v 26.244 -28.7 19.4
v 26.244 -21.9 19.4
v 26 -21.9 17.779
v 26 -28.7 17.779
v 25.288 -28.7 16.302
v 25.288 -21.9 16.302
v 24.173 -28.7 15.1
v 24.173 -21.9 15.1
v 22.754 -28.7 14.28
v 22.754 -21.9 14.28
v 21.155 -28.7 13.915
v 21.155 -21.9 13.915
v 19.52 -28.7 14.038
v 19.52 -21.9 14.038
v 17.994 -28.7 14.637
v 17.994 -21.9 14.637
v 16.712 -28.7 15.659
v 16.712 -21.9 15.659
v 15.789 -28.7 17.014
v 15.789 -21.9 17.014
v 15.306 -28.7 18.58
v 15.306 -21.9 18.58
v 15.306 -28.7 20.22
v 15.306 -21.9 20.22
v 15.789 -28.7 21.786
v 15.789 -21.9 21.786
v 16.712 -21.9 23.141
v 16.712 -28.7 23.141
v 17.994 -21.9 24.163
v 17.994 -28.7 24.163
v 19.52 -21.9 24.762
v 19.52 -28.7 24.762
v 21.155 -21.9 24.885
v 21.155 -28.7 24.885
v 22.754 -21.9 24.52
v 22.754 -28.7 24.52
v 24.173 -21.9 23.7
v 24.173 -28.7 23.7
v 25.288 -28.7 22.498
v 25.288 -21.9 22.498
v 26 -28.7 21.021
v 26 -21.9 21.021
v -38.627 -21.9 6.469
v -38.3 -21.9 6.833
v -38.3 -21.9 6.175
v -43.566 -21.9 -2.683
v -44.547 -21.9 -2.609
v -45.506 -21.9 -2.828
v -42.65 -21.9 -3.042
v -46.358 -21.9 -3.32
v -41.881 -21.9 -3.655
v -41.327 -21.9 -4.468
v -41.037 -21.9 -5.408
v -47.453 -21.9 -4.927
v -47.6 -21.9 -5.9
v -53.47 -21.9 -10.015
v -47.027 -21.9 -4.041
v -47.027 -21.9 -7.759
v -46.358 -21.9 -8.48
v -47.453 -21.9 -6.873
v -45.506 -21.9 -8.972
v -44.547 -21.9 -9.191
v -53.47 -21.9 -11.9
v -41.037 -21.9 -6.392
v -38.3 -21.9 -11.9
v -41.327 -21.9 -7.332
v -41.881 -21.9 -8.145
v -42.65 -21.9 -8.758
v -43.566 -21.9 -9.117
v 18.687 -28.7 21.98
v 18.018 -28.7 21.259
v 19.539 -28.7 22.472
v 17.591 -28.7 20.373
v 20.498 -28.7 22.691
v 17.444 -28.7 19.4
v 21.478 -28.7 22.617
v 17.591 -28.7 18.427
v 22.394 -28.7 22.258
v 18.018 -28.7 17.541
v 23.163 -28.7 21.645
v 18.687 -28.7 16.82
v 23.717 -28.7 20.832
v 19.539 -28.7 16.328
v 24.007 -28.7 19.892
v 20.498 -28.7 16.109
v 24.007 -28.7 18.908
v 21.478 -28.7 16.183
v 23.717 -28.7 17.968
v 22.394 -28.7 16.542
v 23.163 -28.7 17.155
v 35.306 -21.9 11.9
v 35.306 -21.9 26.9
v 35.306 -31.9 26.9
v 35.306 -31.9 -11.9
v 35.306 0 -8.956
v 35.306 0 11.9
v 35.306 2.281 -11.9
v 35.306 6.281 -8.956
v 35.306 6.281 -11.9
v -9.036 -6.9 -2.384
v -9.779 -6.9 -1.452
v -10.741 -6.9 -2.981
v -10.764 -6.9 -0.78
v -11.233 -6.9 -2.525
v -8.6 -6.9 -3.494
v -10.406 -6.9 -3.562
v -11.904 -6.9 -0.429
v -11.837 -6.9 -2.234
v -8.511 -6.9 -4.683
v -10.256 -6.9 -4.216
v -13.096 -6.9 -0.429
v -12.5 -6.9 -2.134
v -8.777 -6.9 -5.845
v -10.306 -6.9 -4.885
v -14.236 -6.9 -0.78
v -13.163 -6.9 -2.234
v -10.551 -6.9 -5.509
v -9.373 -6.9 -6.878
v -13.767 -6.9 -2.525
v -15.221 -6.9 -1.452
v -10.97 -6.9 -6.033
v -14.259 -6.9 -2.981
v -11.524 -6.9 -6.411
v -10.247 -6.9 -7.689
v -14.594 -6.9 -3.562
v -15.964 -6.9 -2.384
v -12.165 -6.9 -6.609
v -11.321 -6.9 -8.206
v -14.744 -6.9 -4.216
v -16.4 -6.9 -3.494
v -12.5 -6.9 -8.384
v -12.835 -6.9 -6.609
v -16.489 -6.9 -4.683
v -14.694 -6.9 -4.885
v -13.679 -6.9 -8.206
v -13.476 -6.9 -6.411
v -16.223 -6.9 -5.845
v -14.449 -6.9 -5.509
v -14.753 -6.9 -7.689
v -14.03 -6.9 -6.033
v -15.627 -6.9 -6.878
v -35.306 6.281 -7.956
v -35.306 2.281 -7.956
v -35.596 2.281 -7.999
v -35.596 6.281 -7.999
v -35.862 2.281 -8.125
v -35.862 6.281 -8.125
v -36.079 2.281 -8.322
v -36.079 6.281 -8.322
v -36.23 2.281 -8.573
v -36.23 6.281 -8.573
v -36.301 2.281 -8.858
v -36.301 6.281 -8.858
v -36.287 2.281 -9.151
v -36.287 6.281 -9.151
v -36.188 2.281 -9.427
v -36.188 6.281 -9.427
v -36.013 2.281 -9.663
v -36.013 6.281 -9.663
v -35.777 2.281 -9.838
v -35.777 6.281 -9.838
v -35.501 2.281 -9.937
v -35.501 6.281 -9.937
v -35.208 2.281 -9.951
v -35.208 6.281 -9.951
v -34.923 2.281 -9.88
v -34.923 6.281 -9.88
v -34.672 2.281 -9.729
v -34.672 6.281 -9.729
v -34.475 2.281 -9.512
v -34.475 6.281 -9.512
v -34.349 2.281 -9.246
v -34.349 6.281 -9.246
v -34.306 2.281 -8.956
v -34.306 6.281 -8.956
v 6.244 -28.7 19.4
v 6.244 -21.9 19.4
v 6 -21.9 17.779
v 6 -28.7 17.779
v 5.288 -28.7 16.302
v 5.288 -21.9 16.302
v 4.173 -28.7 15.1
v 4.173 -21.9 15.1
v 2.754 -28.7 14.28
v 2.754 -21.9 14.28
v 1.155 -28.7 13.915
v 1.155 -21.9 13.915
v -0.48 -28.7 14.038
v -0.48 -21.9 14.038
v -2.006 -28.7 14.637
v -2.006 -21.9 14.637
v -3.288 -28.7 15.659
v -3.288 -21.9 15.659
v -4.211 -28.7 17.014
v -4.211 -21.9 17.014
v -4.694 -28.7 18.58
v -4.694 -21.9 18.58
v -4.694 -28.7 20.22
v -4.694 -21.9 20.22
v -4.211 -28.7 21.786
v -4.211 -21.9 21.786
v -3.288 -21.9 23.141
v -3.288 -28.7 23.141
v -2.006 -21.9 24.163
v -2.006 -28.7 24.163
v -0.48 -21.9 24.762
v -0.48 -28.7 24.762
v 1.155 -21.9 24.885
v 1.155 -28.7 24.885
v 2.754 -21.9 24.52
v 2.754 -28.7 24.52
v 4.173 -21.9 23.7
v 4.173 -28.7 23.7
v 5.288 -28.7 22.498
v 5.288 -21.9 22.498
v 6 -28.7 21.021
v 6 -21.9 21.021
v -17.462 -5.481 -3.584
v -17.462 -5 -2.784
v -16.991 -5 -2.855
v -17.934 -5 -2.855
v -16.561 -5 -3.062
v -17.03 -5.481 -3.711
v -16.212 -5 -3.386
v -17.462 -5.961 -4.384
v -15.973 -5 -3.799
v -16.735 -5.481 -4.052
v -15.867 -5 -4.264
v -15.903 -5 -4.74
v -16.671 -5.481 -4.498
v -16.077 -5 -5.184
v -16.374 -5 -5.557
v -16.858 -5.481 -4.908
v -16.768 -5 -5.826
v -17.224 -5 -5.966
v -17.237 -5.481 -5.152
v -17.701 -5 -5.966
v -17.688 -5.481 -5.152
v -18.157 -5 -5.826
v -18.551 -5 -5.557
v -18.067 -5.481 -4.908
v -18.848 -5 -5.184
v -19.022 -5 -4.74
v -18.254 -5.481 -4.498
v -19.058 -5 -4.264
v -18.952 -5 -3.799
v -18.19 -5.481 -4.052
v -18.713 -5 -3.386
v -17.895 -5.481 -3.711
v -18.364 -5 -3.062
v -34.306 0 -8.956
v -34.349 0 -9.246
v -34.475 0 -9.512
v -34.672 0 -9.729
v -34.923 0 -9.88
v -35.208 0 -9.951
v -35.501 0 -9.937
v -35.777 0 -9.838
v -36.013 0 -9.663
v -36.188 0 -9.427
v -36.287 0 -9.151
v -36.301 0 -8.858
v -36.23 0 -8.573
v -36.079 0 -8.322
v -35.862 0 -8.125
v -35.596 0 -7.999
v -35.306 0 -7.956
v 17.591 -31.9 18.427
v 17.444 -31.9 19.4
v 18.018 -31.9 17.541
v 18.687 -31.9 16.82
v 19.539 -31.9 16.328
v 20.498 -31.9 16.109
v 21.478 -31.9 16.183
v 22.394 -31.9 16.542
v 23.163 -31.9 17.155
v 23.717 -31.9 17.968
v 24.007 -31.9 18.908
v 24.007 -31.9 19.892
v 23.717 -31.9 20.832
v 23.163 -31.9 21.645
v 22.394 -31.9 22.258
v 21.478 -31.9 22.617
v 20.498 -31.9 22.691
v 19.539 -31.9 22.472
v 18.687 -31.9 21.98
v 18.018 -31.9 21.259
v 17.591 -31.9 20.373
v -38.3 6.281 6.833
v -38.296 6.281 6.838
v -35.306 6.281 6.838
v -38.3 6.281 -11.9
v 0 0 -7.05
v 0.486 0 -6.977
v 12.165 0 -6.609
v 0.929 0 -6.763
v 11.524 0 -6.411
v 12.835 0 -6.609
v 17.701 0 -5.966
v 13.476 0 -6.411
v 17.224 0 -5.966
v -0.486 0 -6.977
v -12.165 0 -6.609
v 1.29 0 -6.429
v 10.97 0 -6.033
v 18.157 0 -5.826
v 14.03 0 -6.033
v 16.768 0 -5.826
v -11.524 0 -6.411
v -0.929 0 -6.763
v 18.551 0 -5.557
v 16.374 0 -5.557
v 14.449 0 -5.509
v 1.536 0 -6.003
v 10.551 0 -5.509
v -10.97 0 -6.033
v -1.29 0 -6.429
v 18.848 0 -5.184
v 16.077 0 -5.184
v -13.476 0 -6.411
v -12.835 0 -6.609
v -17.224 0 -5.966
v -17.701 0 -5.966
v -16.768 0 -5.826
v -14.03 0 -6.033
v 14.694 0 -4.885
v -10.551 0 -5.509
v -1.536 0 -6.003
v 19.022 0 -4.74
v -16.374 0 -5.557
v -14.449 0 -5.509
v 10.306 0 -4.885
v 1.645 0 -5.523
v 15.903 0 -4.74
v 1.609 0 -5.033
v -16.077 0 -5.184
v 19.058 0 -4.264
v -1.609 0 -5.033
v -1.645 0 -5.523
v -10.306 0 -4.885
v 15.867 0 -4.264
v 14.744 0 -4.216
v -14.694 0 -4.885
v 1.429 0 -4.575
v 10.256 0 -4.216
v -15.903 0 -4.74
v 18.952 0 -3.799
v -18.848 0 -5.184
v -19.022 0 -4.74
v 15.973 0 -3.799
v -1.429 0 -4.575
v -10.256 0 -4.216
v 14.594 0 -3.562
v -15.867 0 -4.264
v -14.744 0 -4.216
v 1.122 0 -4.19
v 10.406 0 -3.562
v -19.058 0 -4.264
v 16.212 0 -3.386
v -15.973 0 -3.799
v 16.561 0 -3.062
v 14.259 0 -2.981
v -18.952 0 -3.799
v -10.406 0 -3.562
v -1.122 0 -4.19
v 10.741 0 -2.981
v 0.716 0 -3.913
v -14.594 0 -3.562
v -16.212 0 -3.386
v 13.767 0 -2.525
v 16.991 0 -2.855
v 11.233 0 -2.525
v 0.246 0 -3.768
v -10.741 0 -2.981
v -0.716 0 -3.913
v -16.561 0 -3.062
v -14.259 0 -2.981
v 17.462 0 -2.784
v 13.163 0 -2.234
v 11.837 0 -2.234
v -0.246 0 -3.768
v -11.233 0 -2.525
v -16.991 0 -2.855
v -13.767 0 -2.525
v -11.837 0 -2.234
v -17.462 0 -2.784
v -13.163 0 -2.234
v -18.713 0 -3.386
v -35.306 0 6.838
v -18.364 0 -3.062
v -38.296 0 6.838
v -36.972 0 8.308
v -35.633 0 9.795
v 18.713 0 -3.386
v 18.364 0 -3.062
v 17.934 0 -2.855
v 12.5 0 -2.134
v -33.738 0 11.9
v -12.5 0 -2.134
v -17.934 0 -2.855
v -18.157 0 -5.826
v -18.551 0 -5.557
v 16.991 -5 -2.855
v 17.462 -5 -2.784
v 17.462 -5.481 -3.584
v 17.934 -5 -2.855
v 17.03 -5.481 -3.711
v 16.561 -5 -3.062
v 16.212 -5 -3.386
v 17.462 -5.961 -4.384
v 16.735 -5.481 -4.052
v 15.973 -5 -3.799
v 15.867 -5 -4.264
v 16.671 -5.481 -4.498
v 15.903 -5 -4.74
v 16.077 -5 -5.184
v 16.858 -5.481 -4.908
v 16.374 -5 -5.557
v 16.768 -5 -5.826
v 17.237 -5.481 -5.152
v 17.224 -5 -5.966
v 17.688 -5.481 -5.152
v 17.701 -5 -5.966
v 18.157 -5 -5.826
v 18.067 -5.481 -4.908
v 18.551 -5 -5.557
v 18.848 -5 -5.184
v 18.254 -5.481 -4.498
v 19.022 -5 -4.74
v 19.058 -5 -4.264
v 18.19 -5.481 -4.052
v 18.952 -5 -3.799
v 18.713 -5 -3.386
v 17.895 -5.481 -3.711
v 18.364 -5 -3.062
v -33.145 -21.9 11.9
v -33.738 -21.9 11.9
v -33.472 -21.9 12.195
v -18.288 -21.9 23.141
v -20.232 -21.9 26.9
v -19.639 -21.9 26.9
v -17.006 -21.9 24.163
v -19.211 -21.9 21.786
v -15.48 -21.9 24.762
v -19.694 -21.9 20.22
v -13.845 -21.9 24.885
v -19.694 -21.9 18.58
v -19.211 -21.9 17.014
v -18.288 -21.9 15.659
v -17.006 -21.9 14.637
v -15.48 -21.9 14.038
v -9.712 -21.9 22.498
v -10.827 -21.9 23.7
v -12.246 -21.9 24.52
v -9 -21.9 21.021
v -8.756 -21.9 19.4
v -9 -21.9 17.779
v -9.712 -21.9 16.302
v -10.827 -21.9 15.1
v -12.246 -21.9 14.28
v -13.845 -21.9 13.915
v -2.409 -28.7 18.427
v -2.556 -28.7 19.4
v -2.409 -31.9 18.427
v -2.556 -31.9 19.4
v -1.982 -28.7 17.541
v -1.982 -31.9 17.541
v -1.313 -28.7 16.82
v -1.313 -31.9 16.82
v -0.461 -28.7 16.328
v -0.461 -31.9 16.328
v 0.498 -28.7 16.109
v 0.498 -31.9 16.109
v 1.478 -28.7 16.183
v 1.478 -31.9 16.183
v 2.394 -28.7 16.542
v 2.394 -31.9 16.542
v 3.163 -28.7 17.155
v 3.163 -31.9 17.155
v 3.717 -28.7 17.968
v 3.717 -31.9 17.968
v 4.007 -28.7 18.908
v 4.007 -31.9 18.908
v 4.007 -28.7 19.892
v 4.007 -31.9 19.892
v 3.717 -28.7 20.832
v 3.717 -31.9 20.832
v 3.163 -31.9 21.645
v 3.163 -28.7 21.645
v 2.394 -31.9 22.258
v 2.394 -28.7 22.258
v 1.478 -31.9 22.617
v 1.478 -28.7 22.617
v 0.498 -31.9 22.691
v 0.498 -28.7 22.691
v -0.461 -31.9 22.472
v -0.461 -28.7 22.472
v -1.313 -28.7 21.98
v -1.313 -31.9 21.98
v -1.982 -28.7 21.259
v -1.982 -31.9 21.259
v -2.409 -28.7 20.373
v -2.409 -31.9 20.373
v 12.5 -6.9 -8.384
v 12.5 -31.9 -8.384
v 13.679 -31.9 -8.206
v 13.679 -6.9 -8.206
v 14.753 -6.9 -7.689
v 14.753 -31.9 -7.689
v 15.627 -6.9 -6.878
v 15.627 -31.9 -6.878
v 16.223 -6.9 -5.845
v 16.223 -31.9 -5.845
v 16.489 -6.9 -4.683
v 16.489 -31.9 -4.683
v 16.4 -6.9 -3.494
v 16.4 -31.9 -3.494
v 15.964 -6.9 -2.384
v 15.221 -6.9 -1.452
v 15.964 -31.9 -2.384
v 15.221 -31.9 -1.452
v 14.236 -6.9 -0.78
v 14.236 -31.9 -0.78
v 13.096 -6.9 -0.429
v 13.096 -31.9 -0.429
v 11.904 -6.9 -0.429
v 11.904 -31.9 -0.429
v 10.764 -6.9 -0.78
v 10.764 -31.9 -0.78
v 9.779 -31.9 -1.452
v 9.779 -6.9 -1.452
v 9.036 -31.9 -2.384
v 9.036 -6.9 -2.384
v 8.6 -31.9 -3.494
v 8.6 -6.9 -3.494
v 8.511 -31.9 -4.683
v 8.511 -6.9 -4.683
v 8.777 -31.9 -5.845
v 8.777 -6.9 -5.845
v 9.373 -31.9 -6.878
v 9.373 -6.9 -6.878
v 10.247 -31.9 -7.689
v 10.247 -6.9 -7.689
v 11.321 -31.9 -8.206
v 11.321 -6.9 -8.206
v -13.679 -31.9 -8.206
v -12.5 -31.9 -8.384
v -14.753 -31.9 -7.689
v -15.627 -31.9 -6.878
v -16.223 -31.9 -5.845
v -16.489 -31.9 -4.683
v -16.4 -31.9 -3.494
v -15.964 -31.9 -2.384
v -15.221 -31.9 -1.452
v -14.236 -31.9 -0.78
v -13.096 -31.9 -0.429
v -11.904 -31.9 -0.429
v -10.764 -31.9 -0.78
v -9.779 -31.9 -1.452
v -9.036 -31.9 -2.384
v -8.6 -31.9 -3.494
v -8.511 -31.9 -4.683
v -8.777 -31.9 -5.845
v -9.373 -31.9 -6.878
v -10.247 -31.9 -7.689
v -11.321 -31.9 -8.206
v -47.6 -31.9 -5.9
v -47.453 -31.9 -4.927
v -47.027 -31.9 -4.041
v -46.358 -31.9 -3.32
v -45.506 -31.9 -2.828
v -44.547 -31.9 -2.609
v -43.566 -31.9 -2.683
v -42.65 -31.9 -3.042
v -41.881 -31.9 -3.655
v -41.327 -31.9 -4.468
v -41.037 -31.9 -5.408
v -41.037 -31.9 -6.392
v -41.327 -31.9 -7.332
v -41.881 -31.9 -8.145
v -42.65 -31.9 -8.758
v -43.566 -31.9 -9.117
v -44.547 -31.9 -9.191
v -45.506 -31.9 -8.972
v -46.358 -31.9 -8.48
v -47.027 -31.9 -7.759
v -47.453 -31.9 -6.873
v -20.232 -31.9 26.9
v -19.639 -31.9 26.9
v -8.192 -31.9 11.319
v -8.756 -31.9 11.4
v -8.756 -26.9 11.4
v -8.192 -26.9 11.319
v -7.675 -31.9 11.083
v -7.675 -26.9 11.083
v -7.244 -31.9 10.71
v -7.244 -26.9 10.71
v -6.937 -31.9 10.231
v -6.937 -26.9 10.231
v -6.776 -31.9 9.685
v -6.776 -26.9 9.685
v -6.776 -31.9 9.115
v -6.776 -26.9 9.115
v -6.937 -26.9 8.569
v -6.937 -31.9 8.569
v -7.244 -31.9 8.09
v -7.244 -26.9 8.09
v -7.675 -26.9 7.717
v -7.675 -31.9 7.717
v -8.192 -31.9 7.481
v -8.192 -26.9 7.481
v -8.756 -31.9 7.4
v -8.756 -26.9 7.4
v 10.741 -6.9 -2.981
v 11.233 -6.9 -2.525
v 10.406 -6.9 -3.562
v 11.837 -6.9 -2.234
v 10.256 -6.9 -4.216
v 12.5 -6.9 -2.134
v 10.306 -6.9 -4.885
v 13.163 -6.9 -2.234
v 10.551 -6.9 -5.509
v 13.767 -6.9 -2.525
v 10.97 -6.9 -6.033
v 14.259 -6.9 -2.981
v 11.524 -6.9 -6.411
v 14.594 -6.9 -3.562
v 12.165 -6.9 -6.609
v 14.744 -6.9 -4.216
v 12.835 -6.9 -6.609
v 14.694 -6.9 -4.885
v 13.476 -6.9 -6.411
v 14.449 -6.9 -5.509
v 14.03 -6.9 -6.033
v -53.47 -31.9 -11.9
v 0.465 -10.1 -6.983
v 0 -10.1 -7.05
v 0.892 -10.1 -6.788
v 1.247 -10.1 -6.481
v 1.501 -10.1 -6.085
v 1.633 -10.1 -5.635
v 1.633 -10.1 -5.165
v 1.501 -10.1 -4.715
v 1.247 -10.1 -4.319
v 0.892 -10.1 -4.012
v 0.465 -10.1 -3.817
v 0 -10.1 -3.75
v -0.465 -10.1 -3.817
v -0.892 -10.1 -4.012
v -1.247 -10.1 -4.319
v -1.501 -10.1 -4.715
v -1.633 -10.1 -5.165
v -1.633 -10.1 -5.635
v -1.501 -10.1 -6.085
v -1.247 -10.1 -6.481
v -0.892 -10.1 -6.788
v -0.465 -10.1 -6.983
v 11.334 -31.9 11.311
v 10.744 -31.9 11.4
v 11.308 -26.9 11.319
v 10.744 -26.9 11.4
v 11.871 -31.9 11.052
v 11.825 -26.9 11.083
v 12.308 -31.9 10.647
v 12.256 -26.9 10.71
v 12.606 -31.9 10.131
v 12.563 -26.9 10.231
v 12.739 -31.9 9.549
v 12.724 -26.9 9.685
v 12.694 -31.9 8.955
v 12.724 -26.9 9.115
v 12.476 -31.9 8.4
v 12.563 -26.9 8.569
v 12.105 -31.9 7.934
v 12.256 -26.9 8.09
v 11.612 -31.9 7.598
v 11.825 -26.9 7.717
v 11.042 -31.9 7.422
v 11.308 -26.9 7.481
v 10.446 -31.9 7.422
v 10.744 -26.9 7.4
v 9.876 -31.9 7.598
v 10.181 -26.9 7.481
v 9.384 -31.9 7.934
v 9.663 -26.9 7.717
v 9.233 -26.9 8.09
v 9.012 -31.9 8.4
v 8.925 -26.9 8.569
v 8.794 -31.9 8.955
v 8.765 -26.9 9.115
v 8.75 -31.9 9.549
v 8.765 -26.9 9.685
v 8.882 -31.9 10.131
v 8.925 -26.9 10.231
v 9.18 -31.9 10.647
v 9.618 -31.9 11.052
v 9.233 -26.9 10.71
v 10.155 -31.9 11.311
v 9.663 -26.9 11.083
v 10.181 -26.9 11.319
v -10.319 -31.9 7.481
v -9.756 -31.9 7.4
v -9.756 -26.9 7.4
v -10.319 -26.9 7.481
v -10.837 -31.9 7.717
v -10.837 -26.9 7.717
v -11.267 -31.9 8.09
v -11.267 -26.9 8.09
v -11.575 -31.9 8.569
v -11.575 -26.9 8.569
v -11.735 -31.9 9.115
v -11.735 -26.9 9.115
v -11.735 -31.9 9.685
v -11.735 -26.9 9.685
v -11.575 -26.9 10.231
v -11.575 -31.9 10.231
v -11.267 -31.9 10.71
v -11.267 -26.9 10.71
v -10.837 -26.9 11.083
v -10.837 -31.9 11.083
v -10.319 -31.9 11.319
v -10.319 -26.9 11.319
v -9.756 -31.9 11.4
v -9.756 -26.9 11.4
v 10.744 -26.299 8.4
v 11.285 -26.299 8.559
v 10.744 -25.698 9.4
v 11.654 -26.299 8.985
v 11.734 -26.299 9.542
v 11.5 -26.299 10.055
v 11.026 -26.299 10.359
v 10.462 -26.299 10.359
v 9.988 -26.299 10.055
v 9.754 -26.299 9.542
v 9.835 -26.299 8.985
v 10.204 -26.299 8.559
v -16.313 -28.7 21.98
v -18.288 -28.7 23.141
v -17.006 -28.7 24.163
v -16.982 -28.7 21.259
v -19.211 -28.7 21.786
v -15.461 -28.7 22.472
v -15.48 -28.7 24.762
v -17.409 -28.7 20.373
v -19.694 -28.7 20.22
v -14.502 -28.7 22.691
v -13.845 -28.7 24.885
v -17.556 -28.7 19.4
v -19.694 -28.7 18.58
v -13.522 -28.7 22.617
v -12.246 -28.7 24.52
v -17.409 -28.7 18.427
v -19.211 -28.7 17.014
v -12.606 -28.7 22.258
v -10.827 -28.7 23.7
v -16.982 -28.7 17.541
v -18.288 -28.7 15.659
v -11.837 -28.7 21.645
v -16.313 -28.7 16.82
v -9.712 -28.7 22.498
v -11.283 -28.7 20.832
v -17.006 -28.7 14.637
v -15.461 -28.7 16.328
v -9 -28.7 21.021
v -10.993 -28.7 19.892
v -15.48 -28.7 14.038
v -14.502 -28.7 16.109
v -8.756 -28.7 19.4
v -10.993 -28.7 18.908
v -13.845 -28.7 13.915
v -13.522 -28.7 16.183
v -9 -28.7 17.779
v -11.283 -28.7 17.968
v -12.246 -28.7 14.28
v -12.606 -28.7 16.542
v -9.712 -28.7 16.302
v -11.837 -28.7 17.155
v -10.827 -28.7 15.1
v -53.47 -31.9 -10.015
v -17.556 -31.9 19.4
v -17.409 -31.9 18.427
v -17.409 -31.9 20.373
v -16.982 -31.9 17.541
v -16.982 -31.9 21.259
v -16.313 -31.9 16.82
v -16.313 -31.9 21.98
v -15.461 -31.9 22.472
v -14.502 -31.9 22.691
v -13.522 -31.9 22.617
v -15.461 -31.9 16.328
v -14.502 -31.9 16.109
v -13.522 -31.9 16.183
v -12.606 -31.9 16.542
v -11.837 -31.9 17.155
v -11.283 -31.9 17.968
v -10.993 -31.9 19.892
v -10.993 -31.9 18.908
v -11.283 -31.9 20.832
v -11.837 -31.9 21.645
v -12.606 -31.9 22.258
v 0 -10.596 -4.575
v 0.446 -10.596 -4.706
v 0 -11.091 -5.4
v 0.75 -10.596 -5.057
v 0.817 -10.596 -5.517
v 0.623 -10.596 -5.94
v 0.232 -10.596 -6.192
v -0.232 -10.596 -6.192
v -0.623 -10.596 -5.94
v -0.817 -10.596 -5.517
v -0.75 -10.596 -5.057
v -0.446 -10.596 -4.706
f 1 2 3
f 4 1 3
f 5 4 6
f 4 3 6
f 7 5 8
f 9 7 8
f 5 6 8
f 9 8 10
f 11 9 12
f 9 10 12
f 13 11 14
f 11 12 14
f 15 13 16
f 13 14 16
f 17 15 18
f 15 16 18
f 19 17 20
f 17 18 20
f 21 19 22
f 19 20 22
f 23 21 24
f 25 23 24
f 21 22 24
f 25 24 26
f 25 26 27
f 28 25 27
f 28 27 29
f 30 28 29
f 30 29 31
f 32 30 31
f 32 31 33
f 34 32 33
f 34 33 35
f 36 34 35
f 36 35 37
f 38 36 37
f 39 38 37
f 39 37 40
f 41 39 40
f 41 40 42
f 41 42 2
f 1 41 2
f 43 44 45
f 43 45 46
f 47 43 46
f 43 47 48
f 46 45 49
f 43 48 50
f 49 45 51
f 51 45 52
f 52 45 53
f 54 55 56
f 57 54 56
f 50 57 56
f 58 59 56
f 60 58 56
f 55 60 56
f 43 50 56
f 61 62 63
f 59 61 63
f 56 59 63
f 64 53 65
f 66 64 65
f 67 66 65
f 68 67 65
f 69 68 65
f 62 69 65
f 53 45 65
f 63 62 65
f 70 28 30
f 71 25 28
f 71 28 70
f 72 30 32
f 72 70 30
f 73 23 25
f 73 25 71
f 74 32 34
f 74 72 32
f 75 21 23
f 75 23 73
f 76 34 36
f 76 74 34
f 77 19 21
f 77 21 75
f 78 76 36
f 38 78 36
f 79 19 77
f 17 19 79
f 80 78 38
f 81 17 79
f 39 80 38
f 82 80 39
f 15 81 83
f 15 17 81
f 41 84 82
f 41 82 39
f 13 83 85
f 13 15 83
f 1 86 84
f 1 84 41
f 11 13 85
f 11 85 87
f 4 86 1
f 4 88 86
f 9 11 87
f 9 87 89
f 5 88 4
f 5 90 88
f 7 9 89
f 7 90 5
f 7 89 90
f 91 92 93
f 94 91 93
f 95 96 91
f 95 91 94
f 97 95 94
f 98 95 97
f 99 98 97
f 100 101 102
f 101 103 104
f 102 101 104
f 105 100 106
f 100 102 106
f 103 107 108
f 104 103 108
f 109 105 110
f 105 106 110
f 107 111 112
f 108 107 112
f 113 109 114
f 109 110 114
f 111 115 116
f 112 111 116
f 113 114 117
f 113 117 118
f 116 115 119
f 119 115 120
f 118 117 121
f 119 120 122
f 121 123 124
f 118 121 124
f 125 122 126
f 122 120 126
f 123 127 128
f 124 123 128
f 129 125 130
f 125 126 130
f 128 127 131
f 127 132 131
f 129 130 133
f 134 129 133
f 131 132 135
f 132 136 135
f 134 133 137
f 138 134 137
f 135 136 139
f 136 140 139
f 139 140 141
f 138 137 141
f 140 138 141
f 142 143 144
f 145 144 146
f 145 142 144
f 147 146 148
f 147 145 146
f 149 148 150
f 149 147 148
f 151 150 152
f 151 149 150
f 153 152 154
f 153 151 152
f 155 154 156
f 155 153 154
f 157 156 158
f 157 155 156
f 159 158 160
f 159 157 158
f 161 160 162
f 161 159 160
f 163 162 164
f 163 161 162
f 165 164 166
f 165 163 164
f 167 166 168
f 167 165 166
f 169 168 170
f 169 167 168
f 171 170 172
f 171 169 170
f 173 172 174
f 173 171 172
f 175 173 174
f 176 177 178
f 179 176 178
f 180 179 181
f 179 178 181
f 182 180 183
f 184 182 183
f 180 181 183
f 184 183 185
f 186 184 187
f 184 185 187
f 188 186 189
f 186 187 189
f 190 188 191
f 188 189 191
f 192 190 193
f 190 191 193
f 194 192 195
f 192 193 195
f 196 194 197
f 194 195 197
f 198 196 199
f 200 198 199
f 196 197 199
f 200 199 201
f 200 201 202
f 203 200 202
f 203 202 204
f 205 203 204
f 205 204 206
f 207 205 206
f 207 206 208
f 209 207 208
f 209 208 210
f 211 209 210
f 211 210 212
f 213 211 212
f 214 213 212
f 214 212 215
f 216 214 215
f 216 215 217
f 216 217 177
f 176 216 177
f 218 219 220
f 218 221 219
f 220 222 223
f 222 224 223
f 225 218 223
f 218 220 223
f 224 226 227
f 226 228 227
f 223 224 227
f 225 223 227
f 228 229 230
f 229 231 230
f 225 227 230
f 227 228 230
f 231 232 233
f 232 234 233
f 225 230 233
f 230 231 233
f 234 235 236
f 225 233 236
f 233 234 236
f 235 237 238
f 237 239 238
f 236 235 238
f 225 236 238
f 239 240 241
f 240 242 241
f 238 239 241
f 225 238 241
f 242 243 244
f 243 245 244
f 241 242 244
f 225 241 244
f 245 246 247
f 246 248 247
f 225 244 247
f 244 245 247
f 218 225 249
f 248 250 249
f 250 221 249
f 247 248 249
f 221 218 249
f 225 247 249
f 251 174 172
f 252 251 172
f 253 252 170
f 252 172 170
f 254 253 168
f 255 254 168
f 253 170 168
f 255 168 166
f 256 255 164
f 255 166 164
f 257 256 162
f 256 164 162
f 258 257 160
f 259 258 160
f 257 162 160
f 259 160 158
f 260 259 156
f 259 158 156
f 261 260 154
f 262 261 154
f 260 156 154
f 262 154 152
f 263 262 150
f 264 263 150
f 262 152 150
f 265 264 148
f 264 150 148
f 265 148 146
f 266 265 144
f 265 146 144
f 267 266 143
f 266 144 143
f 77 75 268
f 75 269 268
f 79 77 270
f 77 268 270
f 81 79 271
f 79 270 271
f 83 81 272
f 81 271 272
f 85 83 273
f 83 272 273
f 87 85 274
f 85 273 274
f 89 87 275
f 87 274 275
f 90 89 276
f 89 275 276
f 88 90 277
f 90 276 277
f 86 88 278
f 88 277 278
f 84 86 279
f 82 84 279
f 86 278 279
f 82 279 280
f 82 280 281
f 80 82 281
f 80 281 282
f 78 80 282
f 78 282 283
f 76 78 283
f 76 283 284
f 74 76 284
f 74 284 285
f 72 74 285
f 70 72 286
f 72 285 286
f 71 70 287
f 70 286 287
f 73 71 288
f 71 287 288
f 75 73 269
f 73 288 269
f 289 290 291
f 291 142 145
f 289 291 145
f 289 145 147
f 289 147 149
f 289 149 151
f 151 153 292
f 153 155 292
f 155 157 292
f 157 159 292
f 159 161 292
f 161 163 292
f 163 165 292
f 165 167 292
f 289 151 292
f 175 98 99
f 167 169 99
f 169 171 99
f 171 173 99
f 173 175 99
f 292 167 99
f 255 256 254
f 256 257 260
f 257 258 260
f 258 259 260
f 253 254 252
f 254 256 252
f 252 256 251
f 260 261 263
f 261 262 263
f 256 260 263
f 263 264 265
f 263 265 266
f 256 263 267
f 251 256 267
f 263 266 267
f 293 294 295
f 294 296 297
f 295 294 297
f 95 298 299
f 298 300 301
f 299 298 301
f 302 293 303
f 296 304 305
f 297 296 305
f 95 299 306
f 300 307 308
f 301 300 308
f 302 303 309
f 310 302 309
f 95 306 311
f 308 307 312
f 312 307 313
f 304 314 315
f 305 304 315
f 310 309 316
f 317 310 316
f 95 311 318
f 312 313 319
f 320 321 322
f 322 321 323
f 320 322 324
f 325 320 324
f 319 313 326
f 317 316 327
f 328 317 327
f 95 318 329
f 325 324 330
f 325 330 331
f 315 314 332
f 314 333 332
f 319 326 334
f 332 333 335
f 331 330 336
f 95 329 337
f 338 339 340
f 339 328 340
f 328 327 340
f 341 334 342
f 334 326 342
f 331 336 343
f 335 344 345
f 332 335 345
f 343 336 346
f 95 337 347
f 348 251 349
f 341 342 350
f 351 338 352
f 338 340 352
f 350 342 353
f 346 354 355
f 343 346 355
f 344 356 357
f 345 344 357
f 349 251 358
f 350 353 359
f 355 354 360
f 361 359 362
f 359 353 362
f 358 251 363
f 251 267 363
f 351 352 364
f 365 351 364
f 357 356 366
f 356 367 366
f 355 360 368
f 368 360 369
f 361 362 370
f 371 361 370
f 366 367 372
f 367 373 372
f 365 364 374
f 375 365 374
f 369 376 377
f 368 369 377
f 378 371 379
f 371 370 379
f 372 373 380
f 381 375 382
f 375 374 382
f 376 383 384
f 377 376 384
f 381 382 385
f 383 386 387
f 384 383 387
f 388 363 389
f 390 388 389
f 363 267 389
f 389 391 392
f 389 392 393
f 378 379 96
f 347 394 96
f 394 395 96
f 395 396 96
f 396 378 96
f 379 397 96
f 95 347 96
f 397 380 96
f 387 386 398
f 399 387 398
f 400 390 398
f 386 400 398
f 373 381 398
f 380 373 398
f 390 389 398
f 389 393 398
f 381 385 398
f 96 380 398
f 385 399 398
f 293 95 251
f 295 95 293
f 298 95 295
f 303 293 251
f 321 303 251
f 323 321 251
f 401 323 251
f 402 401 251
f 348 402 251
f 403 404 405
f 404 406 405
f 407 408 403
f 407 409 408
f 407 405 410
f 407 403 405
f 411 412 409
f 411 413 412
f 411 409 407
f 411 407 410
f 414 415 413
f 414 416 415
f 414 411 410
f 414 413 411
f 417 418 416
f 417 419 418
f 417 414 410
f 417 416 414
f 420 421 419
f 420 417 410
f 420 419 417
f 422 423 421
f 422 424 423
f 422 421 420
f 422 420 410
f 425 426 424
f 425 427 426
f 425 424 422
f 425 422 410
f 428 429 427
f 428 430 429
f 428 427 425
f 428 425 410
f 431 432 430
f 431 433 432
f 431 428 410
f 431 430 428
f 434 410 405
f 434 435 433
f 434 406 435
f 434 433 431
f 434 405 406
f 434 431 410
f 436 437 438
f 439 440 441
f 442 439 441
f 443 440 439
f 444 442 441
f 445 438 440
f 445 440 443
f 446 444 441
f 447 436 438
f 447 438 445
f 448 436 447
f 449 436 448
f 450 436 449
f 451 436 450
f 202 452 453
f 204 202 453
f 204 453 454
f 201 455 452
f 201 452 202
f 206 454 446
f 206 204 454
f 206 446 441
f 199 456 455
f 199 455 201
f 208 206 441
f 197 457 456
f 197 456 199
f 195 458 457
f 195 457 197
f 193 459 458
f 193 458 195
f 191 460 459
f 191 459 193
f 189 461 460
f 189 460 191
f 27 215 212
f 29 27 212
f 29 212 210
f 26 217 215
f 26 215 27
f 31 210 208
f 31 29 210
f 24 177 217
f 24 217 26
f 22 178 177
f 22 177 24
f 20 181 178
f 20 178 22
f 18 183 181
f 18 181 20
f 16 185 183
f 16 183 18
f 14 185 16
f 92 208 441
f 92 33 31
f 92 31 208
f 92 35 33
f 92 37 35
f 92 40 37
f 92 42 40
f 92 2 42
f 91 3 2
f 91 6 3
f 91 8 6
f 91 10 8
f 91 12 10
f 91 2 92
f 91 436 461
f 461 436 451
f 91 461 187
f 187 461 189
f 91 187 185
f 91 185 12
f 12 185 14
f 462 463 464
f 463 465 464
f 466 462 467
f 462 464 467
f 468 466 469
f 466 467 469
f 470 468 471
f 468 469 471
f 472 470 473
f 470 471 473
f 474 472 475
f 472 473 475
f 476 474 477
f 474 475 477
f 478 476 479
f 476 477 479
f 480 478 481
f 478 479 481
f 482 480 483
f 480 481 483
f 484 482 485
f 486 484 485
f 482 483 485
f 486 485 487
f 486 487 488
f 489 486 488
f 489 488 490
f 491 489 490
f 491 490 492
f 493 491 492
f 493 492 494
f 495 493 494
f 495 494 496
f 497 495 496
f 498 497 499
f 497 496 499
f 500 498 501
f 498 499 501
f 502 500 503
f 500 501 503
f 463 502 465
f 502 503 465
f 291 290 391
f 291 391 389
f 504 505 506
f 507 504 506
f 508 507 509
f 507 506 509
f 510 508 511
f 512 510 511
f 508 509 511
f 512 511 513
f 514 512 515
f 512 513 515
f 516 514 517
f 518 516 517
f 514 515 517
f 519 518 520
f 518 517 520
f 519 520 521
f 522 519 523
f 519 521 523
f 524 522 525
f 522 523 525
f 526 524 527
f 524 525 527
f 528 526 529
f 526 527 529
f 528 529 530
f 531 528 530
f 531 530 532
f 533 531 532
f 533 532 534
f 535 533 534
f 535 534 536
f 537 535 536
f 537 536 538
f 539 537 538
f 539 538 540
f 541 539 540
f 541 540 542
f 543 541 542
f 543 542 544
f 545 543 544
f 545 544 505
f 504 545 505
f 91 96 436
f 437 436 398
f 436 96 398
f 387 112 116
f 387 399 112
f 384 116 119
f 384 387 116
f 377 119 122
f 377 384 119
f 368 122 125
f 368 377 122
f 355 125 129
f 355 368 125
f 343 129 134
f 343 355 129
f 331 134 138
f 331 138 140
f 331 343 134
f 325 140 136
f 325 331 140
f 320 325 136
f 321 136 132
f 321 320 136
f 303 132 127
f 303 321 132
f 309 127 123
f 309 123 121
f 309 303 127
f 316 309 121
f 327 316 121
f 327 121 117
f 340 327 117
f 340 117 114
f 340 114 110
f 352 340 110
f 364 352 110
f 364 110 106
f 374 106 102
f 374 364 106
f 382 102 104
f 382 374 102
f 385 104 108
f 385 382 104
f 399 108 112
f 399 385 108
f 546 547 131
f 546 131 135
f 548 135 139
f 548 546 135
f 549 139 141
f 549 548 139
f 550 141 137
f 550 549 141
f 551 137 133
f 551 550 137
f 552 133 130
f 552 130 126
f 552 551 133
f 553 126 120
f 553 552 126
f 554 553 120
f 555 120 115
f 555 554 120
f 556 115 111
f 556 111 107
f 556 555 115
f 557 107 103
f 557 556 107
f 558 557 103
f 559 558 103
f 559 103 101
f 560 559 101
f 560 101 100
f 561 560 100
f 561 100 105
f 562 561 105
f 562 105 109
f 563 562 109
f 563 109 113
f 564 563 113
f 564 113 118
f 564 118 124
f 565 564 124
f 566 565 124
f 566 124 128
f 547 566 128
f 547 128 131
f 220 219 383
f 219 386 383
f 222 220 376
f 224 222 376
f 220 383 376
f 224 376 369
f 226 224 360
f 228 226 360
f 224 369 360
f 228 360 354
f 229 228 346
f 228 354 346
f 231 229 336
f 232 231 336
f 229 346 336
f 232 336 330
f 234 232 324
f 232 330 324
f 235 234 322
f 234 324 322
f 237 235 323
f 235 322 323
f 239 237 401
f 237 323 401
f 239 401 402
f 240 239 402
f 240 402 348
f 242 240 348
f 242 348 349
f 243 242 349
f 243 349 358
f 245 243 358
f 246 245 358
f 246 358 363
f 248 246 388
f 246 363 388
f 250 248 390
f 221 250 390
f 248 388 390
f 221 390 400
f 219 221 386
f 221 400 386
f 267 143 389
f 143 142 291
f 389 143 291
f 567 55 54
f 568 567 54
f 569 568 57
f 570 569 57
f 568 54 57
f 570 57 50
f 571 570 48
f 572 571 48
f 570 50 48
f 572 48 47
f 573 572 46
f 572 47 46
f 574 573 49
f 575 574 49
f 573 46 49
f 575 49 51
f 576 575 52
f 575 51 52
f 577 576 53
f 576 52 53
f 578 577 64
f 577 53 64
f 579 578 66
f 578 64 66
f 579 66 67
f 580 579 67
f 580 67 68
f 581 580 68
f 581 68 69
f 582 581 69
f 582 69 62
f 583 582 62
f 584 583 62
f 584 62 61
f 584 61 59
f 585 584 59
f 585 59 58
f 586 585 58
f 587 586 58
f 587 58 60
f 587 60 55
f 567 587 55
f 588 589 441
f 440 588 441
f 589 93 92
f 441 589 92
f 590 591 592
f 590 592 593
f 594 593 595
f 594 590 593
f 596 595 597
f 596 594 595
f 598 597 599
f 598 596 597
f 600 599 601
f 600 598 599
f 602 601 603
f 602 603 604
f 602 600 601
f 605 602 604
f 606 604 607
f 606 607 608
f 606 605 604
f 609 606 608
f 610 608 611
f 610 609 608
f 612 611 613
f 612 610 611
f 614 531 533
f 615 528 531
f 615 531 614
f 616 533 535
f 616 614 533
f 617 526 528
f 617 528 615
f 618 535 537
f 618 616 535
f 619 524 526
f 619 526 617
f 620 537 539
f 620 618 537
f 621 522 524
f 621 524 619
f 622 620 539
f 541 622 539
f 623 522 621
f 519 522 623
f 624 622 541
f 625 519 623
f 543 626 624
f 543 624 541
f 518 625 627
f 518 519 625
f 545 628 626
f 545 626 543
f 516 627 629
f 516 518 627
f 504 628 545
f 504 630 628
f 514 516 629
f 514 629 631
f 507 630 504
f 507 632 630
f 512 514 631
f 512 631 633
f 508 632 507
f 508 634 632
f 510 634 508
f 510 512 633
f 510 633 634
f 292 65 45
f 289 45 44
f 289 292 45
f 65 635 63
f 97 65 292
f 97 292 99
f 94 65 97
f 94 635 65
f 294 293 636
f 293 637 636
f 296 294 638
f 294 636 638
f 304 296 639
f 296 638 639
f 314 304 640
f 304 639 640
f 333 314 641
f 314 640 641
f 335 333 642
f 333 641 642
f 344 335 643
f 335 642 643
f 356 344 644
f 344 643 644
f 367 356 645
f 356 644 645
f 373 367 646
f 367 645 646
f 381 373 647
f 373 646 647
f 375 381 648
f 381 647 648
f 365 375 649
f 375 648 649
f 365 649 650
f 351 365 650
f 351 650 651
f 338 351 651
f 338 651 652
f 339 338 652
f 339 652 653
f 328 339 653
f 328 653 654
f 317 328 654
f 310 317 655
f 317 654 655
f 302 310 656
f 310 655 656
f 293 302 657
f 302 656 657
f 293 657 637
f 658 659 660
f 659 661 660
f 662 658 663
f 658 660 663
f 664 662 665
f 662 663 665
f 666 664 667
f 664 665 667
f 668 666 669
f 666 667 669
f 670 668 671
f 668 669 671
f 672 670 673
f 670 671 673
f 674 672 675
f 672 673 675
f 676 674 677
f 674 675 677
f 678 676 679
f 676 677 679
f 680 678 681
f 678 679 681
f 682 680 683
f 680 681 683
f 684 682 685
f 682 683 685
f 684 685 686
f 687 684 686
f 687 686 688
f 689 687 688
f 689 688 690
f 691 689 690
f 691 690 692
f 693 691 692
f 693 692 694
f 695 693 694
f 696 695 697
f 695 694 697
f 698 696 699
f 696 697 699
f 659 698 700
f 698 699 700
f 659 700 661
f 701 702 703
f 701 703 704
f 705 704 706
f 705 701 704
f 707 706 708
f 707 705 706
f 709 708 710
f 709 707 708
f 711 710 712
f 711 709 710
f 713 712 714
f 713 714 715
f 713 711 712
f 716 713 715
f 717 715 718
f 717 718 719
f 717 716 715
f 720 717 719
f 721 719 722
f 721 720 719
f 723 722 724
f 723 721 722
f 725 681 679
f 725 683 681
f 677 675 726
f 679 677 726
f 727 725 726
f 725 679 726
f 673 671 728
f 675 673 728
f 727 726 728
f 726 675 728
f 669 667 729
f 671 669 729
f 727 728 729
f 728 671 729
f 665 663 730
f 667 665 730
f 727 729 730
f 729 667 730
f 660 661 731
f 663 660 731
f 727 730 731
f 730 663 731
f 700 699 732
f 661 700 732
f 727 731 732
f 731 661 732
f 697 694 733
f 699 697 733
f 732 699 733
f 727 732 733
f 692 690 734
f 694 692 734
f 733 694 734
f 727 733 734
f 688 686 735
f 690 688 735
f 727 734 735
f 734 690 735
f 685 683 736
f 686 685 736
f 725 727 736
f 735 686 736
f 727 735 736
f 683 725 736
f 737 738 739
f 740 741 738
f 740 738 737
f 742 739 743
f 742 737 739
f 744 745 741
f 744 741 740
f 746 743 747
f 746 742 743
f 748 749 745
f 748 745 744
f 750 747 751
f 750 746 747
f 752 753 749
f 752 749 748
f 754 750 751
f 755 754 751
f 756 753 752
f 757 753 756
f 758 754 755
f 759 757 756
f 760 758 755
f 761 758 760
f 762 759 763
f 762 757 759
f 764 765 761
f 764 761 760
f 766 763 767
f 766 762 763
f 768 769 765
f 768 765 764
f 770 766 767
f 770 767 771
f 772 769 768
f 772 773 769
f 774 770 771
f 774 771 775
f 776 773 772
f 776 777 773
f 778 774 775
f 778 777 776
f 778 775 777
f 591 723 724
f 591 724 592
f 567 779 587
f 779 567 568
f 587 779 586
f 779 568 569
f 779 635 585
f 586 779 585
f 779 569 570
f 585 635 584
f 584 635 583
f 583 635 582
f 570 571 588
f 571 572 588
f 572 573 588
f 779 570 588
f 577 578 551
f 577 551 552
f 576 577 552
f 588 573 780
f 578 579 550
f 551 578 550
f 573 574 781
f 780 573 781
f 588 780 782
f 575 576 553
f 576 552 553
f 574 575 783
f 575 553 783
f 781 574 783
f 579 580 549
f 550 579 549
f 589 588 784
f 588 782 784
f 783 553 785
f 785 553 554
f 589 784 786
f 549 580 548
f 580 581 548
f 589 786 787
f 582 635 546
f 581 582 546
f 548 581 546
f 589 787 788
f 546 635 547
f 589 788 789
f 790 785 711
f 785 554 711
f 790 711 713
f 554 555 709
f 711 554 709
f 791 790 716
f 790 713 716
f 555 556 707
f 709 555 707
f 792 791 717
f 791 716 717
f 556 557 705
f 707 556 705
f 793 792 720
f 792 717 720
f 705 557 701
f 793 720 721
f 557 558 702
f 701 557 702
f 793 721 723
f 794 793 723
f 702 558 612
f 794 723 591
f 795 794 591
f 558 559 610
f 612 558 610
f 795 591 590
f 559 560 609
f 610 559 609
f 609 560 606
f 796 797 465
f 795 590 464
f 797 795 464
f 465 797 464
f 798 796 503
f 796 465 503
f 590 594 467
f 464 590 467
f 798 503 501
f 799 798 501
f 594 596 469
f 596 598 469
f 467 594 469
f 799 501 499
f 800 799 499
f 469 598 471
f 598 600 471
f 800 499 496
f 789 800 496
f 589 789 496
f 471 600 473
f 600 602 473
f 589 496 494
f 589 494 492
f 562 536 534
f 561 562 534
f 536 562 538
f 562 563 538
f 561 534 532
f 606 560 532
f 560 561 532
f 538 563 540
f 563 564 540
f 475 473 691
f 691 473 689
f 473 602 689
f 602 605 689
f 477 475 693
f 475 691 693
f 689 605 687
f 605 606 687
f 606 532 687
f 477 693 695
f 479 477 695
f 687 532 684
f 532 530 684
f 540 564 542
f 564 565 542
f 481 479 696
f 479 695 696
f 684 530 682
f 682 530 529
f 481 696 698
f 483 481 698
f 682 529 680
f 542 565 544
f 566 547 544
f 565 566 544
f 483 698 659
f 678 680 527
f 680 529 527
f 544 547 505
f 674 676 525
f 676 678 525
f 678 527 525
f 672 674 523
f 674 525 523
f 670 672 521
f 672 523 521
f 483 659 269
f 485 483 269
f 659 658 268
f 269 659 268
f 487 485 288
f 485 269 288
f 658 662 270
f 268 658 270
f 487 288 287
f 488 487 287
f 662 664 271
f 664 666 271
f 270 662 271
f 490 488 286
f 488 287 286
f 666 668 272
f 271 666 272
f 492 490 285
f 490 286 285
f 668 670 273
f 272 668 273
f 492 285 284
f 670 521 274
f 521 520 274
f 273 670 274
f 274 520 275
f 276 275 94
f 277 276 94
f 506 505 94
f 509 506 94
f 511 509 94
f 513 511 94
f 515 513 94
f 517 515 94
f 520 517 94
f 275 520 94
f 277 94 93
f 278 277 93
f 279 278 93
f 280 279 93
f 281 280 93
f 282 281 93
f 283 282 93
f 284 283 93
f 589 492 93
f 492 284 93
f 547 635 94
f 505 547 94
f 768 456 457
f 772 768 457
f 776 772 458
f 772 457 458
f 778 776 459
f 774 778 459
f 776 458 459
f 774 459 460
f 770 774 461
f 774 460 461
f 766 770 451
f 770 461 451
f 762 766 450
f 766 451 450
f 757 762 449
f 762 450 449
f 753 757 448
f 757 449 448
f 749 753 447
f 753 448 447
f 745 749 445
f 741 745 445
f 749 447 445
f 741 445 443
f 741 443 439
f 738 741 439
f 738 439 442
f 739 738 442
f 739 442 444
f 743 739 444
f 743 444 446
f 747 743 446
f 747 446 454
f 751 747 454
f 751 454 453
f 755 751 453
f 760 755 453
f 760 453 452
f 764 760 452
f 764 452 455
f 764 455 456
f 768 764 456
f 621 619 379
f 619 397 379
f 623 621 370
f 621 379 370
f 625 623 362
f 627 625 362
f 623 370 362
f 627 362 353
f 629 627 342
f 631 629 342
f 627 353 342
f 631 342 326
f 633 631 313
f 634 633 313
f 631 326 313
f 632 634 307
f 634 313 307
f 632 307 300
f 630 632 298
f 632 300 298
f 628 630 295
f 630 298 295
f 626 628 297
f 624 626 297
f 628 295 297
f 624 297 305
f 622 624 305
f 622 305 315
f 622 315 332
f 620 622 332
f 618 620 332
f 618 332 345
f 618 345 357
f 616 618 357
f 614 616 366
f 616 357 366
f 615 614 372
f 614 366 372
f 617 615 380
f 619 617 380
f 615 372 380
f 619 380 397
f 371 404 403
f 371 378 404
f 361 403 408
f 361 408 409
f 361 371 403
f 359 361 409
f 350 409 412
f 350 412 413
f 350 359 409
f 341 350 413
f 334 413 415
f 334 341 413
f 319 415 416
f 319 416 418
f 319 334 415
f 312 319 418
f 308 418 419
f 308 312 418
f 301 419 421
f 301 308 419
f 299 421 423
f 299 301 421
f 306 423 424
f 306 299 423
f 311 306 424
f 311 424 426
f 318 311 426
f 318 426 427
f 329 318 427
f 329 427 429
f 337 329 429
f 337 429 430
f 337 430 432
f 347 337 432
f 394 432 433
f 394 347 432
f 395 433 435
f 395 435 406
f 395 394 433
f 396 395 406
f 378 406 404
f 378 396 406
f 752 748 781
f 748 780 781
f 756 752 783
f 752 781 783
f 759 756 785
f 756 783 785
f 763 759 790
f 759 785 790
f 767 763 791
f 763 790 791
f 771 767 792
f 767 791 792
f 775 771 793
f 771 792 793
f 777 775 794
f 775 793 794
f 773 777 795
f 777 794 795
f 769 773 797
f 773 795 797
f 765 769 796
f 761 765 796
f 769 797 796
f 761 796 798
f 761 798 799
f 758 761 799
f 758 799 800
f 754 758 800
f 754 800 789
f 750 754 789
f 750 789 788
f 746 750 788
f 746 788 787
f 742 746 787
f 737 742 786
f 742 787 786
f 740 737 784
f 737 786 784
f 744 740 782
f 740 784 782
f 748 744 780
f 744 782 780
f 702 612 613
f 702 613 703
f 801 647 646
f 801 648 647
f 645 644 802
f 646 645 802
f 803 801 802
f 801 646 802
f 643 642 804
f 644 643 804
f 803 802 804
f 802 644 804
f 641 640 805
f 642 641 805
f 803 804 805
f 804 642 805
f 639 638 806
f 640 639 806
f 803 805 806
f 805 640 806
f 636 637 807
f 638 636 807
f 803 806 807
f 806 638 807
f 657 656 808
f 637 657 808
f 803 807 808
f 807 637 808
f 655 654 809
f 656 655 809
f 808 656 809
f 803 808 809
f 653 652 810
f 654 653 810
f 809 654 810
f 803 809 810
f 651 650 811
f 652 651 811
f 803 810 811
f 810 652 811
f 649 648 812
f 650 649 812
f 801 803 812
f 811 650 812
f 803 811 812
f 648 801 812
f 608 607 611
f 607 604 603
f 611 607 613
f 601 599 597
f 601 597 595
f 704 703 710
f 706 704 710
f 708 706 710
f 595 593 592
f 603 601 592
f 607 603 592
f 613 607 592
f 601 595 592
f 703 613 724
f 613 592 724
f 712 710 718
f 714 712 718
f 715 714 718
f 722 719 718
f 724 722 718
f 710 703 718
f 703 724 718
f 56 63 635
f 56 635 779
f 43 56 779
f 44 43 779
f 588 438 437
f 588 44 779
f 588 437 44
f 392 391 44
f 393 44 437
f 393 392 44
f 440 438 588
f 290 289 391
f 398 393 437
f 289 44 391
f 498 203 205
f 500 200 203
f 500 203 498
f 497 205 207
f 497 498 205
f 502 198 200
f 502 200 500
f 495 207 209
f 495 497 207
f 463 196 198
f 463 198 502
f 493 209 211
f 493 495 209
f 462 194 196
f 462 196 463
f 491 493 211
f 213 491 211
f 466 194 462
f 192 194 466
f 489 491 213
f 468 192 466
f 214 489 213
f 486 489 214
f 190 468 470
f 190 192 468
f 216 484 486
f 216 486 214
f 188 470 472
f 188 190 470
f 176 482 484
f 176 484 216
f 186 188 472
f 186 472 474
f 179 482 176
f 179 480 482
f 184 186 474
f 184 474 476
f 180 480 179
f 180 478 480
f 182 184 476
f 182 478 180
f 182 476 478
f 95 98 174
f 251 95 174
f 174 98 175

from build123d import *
from build123d.topology import SkipClean

# Parameters (mm, degrees)
SKETCH_1_W                = 76.6
SKETCH_1_H                = 23.8
EXTRUDE_1_DEPTH           = 31.899999991
HOLE_WIZARD_M4_1_D        = 3.3
HOLE_WIZARD_M4_1_DEPTH    = 10.1
HOLE_WIZARD_M4_1_TIP      = 0.991420021
SKETCH_5_W                = 23.8
SKETCH_5_H                = 2.281370048
EXTRUDE_2_DEPTH           = 2.994
SKETCH_6_W                = 76.6
SKETCH_6_H                = 2.281370048
EXTRUDE_3_DEPTH           = 2.944
CUT_EXTRUDE_START         = -2.994
SKETCH_7_W                = 26.992148155
SKETCH_7_H                = 47.339562986
CUT_EXTRUDE_1_DEPTH       = 2.994
EXTRUDE_4_DEPTH           = 10
HOLE_WIZARD_3_D           = 6.6
HOLE_WIZARD_3_CBORE_D     = 11
HOLE_WIZARD_3_CBORE_DEPTH = 6.8
SKETCH_21_R               = 3.3
CUT_EXTRUDE_6_DEPTH       = 67.034934903
MM_2_D                    = 4
MM_2_DEPTH                = 5
MM_2_TIP                  = 1.201721238
CUT_EXTRUDE_7_DEPTH       = 5
SKETCH_26_W               = 46.053862543
SKETCH_26_H               = 10
CUT_EXTRUDE_8_DEPTH       = 76.924939501
CUT_EXTRUDE_9_DEPTH       = 67.034934903
SKETCH_29_R               = 1
CUT_EXTRUDE_10_DEPTH      = 2.281370048
EXTRUDE_START             = 4
EXTRUDE_5_DEPTH           = 4
CUT_EXTRUDE_11_DEPTH      = 0.5
EXTRUDE_6_DEPTH           = 0.440630619
CUT_EXTRUDE_12_DEPTH      = 28.181370038
SKETCH_35_W               = 0.294839433
SKETCH_35_H               = 10
CUT_EXTRUDE_13_DEPTH      = 100.471808588
CHAMFER_1_SIZE            = 2
HOLE_WIZARD_4_D           = 4.5
HOLE_WIZARD_4_CBORE_D     = 8
HOLE_WIZARD_4_CBORE_DEPTH = 25
CUT_EXTRUDE_14_DEPTH      = 67.233425798
CUT_EXTRUDE_15_DEPTH      = 6.281370048


with BuildPart() as part:
    # 草图1 → 凸台-拉伸1 (new body)
    with BuildSketch(Plane(origin=(0, 0, 0), x_dir=(1, 0, 0), z_dir=(0, 1, 0))):
        Rectangle(SKETCH_1_W, SKETCH_1_H)
    extrude(amount=-EXTRUDE_1_DEPTH)

    # M4 螺纹孔1
    with Locations(Plane(origin=(0, 0, -5.4), x_dir=(0, 0, 1), z_dir=(0, 1, 0))):
        with Locations((0, 0)):
            Hole(HOLE_WIZARD_M4_1_D / 2, depth=HOLE_WIZARD_M4_1_DEPTH)
            with Locations((0, 0, -(HOLE_WIZARD_M4_1_DEPTH + HOLE_WIZARD_M4_1_TIP / 2))):  # 118° drill point
                Cone(0, HOLE_WIZARD_M4_1_D / 2, HOLE_WIZARD_M4_1_TIP, mode=Mode.SUBTRACT)

    # 草图5 → 凸台-拉伸2 (add)
    with BuildSketch(Plane.ZY.offset(38.3)):
        with Locations((0, 1.140685024)):
            Rectangle(SKETCH_5_W, SKETCH_5_H)
    extrude(amount=-EXTRUDE_2_DEPTH)

    # 草图6 → 凸台-拉伸3 (add)
    with BuildSketch(Plane(origin=(0, 0, -11.9), x_dir=(-1, 0, 0), z_dir=(0, 0, -1))):
        with Locations((0, 1.140685024)):
            Rectangle(SKETCH_6_W, SKETCH_6_H)
    extrude(amount=-EXTRUDE_3_DEPTH)

    # 草图7 → 切除-拉伸1 (cut)
    with BuildSketch(Plane(origin=(38.3, 0, 0), x_dir=(0, 0, -1), z_dir=(1, 0, 0)).offset(CUT_EXTRUDE_START)):
        with Locations((-1.596074077, -8.230218498)):
            Rectangle(SKETCH_7_W, SKETCH_7_H)
    extrude(amount=CUT_EXTRUDE_1_DEPTH, mode=Mode.SUBTRACT)

    # 草图9 → 大小mm 暗销孔1 (revolve, cut)
    with BuildSketch(Plane(origin=(17.4625, 0, -4.384), x_dir=(0, 0, 1), z_dir=(1, 0, 0))):
        Polygon((0, 0), (0, 5.96137699), (1.6, 5), (1.6, 0), align=None)
    mm_1 = revolve(axis=Axis((17.4625, 6.35, -4.384), (0, -1, 0)), mode=Mode.SUBTRACT)

    # 镜向3: 大小mm 暗销孔1 across plane
    add(mm_1.mirror(Plane(origin=(0, 0, 0), x_dir=(0, 0, 1), z_dir=(1, 0, 0))), mode=Mode.SUBTRACT)

    # 草图16 → 凸台-拉伸4 (add)
    with BuildSketch(Plane.XZ.offset(31.899999991)):
        Polygon((-38.3, 6.921881597), (-55.247298311, -11.9), (-38.3, -11.9), align=None)
        Polygon((-33.817682057, 11.9), (-20.311621392, 26.9), (35.306, 26.9), (35.306, 11.9), align=None)
    extrude(amount=-EXTRUDE_4_DEPTH)

    # 打孔尺寸(%根据)内六角圆柱头螺钉的类型3 (through all)
    with Locations(Plane(origin=(-14.255841028, -21.899999991, 19.4), x_dir=(1, 0, 0), z_dir=(0, 1, 0))):
        with Locations((0, 0), (15, 0), (35, 0)):
            CounterBoreHole(HOLE_WIZARD_3_D / 2, HOLE_WIZARD_3_CBORE_D / 2, HOLE_WIZARD_3_CBORE_DEPTH)

    # 草图21 → 切除-拉伸6 (cut, through all)
    with BuildSketch(Plane(origin=(0, -21.899999991, 0), x_dir=(1, 0, 0), z_dir=(0, 1, 0))):
        with Locations(Location((-44.3, 5.9, 0), (0, 0, 180))):
            Circle(SKETCH_21_R)
    extrude(amount=-CUT_EXTRUDE_6_DEPTH, mode=Mode.SUBTRACT)

    # 大小mm 暗销孔2
    with Locations(Plane(origin=(10.744158972, -31.899999991, 9.4), x_dir=(0, 0, -1), z_dir=(0, -1, 0))):
        with Locations((0, 0)):
            Hole(MM_2_D / 2, depth=MM_2_DEPTH)
            with Locations((0, 0, -(MM_2_DEPTH + MM_2_TIP / 2))):  # 118° drill point
                Cone(0, MM_2_D / 2, MM_2_TIP, mode=Mode.SUBTRACT)

    # 草图25 → 切除-拉伸7 (cut)
    with BuildSketch(Plane.XZ.offset(31.899999991)):
        with BuildLine():
            Line((-9.755841028, 11.4), (-8.755841028, 11.4))
            ThreePointArc((-8.755841028, 11.4), (-6.755841028, 9.4), (-8.755841028, 7.4))
            Line((-8.755841028, 7.4), (-9.755841028, 7.4))
            ThreePointArc((-9.755841028, 7.4), (-11.755841028, 9.4), (-9.755841028, 11.4))
        make_face()
    extrude(amount=-CUT_EXTRUDE_7_DEPTH, mode=Mode.SUBTRACT)

    # 草图26 → 切除-拉伸8 (cut, through all)
    with BuildSketch(Plane(origin=(-24.593701474, 0, 22.144268272), x_dir=(0.6691306063588817, 0, 0.7431448254773731), z_dir=(-0.7431448254773731, 0, 0.6691306063588817))):
        with Locations((-11.827706241, -26.899999991)):
            Rectangle(SKETCH_26_W, SKETCH_26_H)
    extrude(amount=CUT_EXTRUDE_8_DEPTH, mode=Mode.SUBTRACT)

    # 草图27 → 切除-拉伸9 (cut, through all)
    with BuildSketch(Plane.XZ.offset(21.899999991)):
        Polygon((-38.3, 6.921881597), (-33.817682057, 11.9), (-38.3, 11.9), align=None)
    extrude(amount=-CUT_EXTRUDE_9_DEPTH, mode=Mode.SUBTRACT)

    # 草图29 → 切除-拉伸10 (cut)
    with BuildSketch(Plane(origin=(0, 2.281370048, 0), x_dir=(1, 0, 0), z_dir=(0, 1, 0))):
        with Locations((-35.306, 8.956)):
            Circle(SKETCH_29_R)
    extrude(amount=-CUT_EXTRUDE_10_DEPTH, mode=Mode.SUBTRACT)

    # 草图31 → 凸台-拉伸5 (add)
    with SkipClean():  # the faces are left unmerged after this step: merging them gives an invalid solid
        with BuildSketch(Plane(origin=(0, 2.281370048, 0), x_dir=(1, 0, 0), z_dir=(0, 1, 0)).offset(EXTRUDE_START)):
            with BuildLine():
                Line((-34.306, 8.956), (35.306, 8.956))
                Line((35.306, 8.956), (35.306, 11.9))
                Line((35.306, 11.9), (-38.3, 11.9))
                Line((-38.3, 11.9), (-38.3, -6.921881597))
                Line((-38.3, -6.921881597), (-35.306, -10.247055466))
                Line((-35.306, -10.247055466), (-35.306, 7.956))
                ThreePointArc((-35.306, 7.956), (-36.013106781, 9.663106781), (-34.306, 8.956))
            make_face()
        extrude(amount=-EXTRUDE_5_DEPTH)

    # 草图32 → 切除-拉伸11 (cut)
    with SkipClean():  # the faces are left unmerged after this step: merging them gives an invalid solid
        with BuildSketch(Plane(origin=(-24.593701474, 0, 22.144268272), x_dir=(0.6691306063588817, 0, 0.7431448254773731), z_dir=(-0.7431448254773731, 0, 0.6691306063588817))):
            Polygon((-23.813531784, -21.899999991), (-45.811081642, -21.899999991), (-45.811081642, -31.899999991), (7.49870663, -31.899999991), (7.49870663, -21.899999991), (-11.951824765, -21.899999991), (-11.951824765, 0), (-16.009278942, 0), (-16.009278942, 6.281370048), (-23.813531784, 6.281370048), align=None)
        extrude(amount=-CUT_EXTRUDE_11_DEPTH, mode=Mode.SUBTRACT)

    # 草图33 → 凸台-拉伸6 (add)
    with SkipClean():  # the faces are left unmerged after this step: merging them gives an invalid solid
        with BuildSketch(Plane(origin=(-24.222129061, 0, 21.809702968), x_dir=(0.6691306063588818, 0, 0.743144825477373), z_dir=(-0.743144825477373, 0, 0.6691306063588818))):
            Polygon((-45.36087962, -21.899999991), (-45.36087962, -31.899999991), (6.849670289, -31.899999991), (6.849670289, -21.899999991), (-13.334820655, -21.899999991), (-13.334820655, 0), (-16.564585199, 0), (-16.564585199, 6.281370048), (-21.03904799, 6.281370048), (-21.03904799, -21.899999991), align=None)
        extrude(amount=EXTRUDE_6_DEPTH)

    # 草图34 → 切除-拉伸12 (cut)
    with SkipClean():  # the faces are left unmerged after this step: merging them gives an invalid solid
        with BuildSketch(Plane(origin=(0, 6.281370048, 0), x_dir=(1, 0, 0), z_dir=(0, 1, 0))):
            Polygon((-38.3, -6.174643322), (-38.3, -6.833155448), (-38.627452364, -6.469482755), align=None)
            Polygon((-33.144865692, -11.9), (-33.737792674, -11.9), (-33.472318056, -12.194839433), align=None)
        extrude(amount=-CUT_EXTRUDE_12_DEPTH, mode=Mode.SUBTRACT)

    # 草图35 → 切除-拉伸13 (cut, through all)
    with SkipClean():  # the faces are left unmerged after this step: merging them gives an invalid solid
        with BuildSketch(Plane(origin=(35.306, 0, 0), x_dir=(0, 0, -1), z_dir=(1, 0, 0))):
            with Locations((-27.047419717, -26.899999991)):
                Rectangle(SKETCH_35_W, SKETCH_35_H)
        extrude(amount=-CUT_EXTRUDE_13_DEPTH, mode=Mode.SUBTRACT)

    # 倒角1
    # the kernel refuses this chamfer: 2 mm, written as the material it takes off along each edge
    with BuildSketch(Plane(origin=(-54.901934311, -16.756634015, -11.605160567), x_dir=(0.7244655223975905, 0, -0.6893110378176068), z_dir=(0, -1, 0))) as chamfer_1_piece_1:
        Polygon((CHAMFER_1_SIZE * 0.999621916911, CHAMFER_1_SIZE * 0.0274958766106), (-CHAMFER_1_SIZE * 0.0274958766106, CHAMFER_1_SIZE * 0.999621916911), (0, 0), align=None)
    extrude(amount=20.286731952, mode=Mode.SUBTRACT)
    with BuildSketch(Plane(origin=(-35.633452364, 0, 9.794656625), x_dir=(-0.6893110378176083, 0, -0.7244655223975892), z_dir=(0, 1, 0))) as chamfer_1_piece_2:
        Polygon((CHAMFER_1_SIZE * 0.999621916911, -CHAMFER_1_SIZE * 0.0274958766106), (-CHAMFER_1_SIZE * 0.0274958766106, -CHAMFER_1_SIZE * 0.999621916911), (0, 0), align=None)
    extrude(amount=11.424736024, mode=Mode.SUBTRACT)

    # 打孔尺寸(%根据)内六角圆柱头螺钉的类型4 (through all)
    with Locations(Plane(origin=(12.5, -31.899999991, -4.384), x_dir=(0, 0, -1), z_dir=(0, -1, 0))):
        with Locations((0, 0)):
            hole_wizard_4 = CounterBoreHole(HOLE_WIZARD_4_D / 2, HOLE_WIZARD_4_CBORE_D / 2, HOLE_WIZARD_4_CBORE_DEPTH)

    # 镜向4: 打孔尺寸(%根据)内六角圆柱头螺钉的类型4 across plane
    add(hole_wizard_4.mirror(Plane(origin=(0, 0, 0), x_dir=(0, 0, 1), z_dir=(1, 0, 0))), mode=Mode.SUBTRACT)

    # 草图39 → 切除-拉伸14 (cut, through all)
    with BuildSketch(Plane(origin=(0, -21.899999991, 0), x_dir=(1, 0, 0), z_dir=(0, 1, 0))):
        Polygon((-53.470328078, 11.9), (-53.470328078, 10.015200769), (-53.563673098, 10.118870916), align=None)
    extrude(amount=-CUT_EXTRUDE_14_DEPTH, mode=Mode.SUBTRACT)

    # 草图40 → 切除-拉伸15 (cut)
    with BuildSketch(Plane(origin=(0, 6.281370048, 0), x_dir=(1, 0, 0), z_dir=(0, 1, 0))):
        Polygon((-38.3, -6.837514338), (-35.306, -6.837514338), (-35.306, -8.395663323), (-36.971713577, -8.308366973), align=None)
    extrude(amount=-CUT_EXTRUDE_15_DEPTH, mode=Mode.SUBTRACT)


solid = part.part
